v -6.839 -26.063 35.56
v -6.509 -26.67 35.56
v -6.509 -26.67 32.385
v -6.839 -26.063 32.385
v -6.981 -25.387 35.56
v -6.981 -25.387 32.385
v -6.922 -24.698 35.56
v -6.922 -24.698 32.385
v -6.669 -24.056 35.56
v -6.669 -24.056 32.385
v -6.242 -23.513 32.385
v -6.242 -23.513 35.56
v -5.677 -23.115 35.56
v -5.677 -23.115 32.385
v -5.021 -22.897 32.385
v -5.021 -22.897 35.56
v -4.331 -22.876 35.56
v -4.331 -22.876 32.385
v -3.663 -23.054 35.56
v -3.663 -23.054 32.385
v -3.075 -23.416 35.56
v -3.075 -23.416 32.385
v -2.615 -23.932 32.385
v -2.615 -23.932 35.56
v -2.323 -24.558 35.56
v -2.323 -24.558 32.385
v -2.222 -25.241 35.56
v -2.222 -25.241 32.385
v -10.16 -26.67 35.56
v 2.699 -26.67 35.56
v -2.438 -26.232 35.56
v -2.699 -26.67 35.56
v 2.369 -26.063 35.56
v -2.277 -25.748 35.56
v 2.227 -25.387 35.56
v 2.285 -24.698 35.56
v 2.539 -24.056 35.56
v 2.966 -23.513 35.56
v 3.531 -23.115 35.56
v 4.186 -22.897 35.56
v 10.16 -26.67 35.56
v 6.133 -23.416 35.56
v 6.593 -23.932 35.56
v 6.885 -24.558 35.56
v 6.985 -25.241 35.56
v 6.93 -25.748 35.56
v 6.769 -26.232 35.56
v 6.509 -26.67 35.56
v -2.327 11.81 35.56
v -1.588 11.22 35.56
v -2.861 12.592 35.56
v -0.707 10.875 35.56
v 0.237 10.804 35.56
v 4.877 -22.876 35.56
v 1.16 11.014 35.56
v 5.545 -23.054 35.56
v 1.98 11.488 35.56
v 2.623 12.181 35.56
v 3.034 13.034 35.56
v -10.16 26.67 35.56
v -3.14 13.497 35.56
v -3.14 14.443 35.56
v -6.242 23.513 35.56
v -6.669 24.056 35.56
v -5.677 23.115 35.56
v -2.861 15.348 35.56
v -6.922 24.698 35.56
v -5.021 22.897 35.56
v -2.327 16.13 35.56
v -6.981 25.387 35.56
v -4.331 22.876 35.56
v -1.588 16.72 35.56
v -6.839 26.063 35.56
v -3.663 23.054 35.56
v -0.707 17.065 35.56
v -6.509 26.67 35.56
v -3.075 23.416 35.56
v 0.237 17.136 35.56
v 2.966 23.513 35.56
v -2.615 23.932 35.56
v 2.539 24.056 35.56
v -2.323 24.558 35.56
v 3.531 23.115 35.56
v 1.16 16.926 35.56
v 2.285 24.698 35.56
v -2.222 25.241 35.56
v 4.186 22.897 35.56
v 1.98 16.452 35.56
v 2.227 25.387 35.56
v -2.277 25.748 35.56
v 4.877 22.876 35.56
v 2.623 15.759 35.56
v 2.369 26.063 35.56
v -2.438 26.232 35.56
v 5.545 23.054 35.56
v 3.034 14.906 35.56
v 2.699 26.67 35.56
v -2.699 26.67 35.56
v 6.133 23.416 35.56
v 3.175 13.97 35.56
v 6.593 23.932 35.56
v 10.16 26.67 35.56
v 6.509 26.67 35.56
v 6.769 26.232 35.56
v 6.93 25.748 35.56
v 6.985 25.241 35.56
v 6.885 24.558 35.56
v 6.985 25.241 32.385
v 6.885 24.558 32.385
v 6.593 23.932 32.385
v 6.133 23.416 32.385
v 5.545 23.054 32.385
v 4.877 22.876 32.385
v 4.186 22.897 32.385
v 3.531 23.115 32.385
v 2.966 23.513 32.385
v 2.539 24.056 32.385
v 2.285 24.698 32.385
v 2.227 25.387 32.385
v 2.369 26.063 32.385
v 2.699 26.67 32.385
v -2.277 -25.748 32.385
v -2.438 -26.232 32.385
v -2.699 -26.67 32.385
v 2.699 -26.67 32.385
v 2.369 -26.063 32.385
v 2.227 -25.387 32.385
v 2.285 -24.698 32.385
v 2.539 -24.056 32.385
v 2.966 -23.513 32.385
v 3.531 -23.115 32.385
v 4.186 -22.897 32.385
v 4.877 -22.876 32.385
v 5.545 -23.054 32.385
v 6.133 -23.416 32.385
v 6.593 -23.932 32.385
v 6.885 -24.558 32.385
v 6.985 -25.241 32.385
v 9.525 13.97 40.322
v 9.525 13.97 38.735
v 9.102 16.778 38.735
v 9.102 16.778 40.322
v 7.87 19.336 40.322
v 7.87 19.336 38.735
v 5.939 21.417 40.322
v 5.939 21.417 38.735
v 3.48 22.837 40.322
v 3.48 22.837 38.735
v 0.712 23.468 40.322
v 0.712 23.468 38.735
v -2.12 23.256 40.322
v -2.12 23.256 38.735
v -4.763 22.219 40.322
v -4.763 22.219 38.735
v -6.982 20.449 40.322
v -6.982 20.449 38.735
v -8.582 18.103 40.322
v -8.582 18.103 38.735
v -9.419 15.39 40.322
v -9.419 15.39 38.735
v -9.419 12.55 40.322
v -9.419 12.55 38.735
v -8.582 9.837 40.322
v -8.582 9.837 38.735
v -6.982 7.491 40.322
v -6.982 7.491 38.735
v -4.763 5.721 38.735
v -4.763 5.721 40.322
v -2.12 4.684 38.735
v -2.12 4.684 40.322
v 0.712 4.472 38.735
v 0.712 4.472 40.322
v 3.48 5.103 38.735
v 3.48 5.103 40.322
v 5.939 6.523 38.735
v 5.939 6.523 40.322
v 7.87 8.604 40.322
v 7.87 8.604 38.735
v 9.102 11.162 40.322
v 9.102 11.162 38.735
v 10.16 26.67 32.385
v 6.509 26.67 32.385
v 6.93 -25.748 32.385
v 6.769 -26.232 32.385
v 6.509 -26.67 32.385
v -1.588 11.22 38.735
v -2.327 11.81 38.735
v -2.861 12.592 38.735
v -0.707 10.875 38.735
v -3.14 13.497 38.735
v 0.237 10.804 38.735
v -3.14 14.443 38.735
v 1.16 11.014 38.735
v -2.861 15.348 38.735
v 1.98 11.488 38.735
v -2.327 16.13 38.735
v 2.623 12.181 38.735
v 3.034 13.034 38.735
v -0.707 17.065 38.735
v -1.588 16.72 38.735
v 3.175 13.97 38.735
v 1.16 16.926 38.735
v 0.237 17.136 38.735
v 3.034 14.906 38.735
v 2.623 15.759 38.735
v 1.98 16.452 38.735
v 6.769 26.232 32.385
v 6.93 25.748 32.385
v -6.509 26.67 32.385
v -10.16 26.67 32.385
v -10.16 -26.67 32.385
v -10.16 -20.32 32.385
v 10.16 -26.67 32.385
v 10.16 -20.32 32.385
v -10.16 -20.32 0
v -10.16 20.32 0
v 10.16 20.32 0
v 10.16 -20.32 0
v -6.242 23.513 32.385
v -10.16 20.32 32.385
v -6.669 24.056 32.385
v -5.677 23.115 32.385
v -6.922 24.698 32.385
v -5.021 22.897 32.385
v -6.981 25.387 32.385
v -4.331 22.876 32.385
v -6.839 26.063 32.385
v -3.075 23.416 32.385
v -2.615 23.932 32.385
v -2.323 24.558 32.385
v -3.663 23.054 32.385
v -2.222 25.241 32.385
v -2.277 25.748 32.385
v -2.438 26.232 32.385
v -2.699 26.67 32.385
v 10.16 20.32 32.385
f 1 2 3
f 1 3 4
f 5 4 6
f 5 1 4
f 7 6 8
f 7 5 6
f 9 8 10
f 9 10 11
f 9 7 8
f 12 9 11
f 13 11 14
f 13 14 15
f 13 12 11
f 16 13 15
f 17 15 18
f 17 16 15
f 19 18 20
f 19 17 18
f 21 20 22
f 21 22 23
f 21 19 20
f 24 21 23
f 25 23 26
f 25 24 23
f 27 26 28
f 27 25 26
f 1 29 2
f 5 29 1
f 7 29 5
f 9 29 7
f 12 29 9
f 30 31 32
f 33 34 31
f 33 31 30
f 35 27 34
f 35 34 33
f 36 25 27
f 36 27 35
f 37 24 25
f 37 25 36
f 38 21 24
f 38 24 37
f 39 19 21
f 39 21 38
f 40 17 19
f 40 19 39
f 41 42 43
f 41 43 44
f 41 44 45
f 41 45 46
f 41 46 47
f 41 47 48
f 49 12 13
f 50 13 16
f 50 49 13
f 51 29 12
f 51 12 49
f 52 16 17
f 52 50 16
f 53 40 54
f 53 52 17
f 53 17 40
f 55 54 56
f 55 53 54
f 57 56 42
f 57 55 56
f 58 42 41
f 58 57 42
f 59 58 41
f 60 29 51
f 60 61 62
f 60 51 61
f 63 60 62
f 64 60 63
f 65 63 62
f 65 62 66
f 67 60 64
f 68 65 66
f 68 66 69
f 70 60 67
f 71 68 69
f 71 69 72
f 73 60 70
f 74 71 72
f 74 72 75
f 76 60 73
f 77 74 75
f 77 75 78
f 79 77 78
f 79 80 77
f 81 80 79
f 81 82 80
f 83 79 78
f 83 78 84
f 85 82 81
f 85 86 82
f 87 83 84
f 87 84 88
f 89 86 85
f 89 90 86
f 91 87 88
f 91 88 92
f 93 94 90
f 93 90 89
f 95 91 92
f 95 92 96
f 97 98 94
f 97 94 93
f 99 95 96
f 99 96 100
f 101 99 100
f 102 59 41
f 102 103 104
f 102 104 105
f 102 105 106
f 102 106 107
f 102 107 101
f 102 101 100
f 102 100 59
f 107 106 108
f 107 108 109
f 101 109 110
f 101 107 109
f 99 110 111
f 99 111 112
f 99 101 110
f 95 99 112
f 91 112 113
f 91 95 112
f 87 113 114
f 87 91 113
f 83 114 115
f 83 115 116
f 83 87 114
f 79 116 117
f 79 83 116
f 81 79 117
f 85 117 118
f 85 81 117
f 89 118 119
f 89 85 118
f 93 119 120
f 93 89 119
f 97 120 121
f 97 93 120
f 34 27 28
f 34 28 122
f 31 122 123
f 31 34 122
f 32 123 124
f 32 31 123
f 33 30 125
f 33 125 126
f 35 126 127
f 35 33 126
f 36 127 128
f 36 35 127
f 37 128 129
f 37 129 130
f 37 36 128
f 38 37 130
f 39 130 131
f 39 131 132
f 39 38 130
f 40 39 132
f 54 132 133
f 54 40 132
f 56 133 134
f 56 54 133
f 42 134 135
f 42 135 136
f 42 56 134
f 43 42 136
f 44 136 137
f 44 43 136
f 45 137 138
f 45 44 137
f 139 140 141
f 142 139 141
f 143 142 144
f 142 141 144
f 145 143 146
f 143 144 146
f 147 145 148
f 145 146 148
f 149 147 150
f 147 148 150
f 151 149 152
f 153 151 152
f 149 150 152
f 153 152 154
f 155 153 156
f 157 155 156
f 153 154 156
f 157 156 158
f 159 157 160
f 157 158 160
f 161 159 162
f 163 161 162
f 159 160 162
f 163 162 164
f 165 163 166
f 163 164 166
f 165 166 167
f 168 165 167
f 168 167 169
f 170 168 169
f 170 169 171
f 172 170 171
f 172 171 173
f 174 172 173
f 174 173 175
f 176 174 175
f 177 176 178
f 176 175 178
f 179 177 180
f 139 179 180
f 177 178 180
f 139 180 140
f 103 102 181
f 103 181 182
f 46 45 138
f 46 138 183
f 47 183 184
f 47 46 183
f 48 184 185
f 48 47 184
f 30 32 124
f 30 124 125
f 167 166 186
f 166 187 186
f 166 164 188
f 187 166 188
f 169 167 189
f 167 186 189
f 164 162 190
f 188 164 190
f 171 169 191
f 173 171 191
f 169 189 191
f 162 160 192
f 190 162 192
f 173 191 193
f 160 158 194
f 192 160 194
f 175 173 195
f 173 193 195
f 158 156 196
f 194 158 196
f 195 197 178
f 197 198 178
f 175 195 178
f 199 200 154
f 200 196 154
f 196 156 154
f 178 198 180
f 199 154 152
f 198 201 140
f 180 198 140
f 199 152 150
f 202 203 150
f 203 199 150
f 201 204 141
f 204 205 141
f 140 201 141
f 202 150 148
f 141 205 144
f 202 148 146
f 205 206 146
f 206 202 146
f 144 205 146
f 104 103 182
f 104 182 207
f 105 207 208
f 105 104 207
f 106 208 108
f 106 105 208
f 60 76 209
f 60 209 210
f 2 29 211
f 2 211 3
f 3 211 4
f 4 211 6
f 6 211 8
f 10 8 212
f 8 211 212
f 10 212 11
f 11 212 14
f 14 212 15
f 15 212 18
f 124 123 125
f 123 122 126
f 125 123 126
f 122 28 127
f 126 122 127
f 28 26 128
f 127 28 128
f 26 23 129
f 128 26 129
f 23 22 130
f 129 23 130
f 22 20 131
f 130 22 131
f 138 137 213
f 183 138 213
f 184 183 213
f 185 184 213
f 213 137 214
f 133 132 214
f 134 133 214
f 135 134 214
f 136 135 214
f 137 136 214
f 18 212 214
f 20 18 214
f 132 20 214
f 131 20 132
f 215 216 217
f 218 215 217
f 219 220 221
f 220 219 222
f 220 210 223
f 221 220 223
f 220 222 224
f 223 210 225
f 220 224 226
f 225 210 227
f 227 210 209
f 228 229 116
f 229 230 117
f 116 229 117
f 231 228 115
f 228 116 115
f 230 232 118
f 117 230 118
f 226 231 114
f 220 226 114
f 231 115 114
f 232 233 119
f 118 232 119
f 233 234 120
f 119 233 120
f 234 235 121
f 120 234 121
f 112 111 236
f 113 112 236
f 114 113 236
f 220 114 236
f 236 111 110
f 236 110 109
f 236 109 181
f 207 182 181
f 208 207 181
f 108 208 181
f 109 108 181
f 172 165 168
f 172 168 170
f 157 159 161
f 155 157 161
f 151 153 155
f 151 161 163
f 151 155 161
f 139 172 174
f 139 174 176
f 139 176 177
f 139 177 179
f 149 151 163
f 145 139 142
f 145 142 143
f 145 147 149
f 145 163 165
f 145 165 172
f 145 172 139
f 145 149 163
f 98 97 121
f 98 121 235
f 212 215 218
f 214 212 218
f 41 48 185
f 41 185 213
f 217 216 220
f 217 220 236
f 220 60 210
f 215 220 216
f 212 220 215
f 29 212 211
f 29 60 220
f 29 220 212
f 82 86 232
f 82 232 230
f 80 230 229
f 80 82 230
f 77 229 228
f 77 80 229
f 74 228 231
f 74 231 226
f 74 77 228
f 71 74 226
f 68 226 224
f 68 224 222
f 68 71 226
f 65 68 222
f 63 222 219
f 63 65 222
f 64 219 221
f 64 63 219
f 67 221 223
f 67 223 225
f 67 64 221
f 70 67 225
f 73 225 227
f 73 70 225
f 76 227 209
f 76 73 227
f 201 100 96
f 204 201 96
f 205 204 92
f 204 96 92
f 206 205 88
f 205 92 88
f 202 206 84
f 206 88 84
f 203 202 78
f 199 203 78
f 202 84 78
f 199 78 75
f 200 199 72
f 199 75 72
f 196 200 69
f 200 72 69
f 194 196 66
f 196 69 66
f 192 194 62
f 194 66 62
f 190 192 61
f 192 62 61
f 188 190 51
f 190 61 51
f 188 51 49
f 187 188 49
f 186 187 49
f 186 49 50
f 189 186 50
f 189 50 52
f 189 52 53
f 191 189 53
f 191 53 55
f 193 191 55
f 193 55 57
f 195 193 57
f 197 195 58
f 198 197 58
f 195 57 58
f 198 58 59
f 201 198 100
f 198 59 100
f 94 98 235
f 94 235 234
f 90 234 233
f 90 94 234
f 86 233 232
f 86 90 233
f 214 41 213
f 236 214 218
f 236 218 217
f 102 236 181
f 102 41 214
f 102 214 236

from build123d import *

# Parameters (mm, degrees)
F0_W     = 20.32
F0_H     = 40.64
F1_DEPTH = 35.56
F3_DEPTH = 3.175
F4_R     = 3.175
F5_DEPTH = 3.175
F6_R     = 9.525
F7_DEPTH = 1.5875


with BuildPart() as f1:
    # F0 (on Top) → F1 (new body)
    with BuildSketch(Plane.XY):
        Rectangle(F0_W, F0_H)
    extrude(amount=F1_DEPTH)

    # F2 (on face) → F3 (join)
    with BuildSketch(Plane.XY.offset(35.56)):
        with BuildLine():
            Line((-10.16, 26.67), (-10.16, 20.32))
            Line((-10.16, 20.32), (10.16, 20.32))
            Line((10.16, 20.32), (10.16, 26.67))
            Line((10.16, 26.67), (6.50875, 26.67))
            ThreePointArc((6.50875, 26.67), (6.862802, 25.994267), (6.985, 25.24125))
            ThreePointArc((6.985, 25.24125), (3.850733, 22.982198), (2.69875, 26.67))
            Line((2.69875, 26.67), (-2.69875, 26.67))
            ThreePointArc((-2.69875, 26.67), (-2.344698, 25.994267), (-2.2225, 25.24125))
            ThreePointArc((-2.2225, 25.24125), (-5.356767, 22.982198), (-6.50875, 26.67))
            Line((-6.50875, 26.67), (-10.16, 26.67))
        make_face()
        with BuildLine():
            Line((10.16, -20.32), (-10.16, -20.32))
            Line((-10.16, -20.32), (-10.16, -26.67))
            Line((-10.16, -26.67), (-6.50875, -26.67))
            ThreePointArc((-6.50875, -26.67), (-5.356767, -22.982198), (-2.2225, -25.24125))
            ThreePointArc((-2.2225, -25.24125), (-2.344698, -25.994267), (-2.69875, -26.67))
            Line((-2.69875, -26.67), (2.69875, -26.67))
            ThreePointArc((2.69875, -26.67), (3.850733, -22.982198), (6.985, -25.24125))
            ThreePointArc((6.985, -25.24125), (6.862802, -25.994267), (6.50875, -26.67))
            Line((6.50875, -26.67), (10.16, -26.67))
            Line((10.16, -26.67), (10.16, -20.32))
        make_face()
    extrude(amount=-F3_DEPTH)

    # F4 (on face) → F5 (join)
    with BuildSketch(Plane.XY.offset(35.56)):
        with Locations((0, 13.97)):
            Circle(F4_R)
    extrude(amount=F5_DEPTH)

    # F6 (on face) → F7 (join)
    with BuildSketch(Plane.XY.offset(38.735)):
        with Locations((0, 13.97)):
            Circle(F6_R)
    extrude(amount=F7_DEPTH)


solid = f1.part
